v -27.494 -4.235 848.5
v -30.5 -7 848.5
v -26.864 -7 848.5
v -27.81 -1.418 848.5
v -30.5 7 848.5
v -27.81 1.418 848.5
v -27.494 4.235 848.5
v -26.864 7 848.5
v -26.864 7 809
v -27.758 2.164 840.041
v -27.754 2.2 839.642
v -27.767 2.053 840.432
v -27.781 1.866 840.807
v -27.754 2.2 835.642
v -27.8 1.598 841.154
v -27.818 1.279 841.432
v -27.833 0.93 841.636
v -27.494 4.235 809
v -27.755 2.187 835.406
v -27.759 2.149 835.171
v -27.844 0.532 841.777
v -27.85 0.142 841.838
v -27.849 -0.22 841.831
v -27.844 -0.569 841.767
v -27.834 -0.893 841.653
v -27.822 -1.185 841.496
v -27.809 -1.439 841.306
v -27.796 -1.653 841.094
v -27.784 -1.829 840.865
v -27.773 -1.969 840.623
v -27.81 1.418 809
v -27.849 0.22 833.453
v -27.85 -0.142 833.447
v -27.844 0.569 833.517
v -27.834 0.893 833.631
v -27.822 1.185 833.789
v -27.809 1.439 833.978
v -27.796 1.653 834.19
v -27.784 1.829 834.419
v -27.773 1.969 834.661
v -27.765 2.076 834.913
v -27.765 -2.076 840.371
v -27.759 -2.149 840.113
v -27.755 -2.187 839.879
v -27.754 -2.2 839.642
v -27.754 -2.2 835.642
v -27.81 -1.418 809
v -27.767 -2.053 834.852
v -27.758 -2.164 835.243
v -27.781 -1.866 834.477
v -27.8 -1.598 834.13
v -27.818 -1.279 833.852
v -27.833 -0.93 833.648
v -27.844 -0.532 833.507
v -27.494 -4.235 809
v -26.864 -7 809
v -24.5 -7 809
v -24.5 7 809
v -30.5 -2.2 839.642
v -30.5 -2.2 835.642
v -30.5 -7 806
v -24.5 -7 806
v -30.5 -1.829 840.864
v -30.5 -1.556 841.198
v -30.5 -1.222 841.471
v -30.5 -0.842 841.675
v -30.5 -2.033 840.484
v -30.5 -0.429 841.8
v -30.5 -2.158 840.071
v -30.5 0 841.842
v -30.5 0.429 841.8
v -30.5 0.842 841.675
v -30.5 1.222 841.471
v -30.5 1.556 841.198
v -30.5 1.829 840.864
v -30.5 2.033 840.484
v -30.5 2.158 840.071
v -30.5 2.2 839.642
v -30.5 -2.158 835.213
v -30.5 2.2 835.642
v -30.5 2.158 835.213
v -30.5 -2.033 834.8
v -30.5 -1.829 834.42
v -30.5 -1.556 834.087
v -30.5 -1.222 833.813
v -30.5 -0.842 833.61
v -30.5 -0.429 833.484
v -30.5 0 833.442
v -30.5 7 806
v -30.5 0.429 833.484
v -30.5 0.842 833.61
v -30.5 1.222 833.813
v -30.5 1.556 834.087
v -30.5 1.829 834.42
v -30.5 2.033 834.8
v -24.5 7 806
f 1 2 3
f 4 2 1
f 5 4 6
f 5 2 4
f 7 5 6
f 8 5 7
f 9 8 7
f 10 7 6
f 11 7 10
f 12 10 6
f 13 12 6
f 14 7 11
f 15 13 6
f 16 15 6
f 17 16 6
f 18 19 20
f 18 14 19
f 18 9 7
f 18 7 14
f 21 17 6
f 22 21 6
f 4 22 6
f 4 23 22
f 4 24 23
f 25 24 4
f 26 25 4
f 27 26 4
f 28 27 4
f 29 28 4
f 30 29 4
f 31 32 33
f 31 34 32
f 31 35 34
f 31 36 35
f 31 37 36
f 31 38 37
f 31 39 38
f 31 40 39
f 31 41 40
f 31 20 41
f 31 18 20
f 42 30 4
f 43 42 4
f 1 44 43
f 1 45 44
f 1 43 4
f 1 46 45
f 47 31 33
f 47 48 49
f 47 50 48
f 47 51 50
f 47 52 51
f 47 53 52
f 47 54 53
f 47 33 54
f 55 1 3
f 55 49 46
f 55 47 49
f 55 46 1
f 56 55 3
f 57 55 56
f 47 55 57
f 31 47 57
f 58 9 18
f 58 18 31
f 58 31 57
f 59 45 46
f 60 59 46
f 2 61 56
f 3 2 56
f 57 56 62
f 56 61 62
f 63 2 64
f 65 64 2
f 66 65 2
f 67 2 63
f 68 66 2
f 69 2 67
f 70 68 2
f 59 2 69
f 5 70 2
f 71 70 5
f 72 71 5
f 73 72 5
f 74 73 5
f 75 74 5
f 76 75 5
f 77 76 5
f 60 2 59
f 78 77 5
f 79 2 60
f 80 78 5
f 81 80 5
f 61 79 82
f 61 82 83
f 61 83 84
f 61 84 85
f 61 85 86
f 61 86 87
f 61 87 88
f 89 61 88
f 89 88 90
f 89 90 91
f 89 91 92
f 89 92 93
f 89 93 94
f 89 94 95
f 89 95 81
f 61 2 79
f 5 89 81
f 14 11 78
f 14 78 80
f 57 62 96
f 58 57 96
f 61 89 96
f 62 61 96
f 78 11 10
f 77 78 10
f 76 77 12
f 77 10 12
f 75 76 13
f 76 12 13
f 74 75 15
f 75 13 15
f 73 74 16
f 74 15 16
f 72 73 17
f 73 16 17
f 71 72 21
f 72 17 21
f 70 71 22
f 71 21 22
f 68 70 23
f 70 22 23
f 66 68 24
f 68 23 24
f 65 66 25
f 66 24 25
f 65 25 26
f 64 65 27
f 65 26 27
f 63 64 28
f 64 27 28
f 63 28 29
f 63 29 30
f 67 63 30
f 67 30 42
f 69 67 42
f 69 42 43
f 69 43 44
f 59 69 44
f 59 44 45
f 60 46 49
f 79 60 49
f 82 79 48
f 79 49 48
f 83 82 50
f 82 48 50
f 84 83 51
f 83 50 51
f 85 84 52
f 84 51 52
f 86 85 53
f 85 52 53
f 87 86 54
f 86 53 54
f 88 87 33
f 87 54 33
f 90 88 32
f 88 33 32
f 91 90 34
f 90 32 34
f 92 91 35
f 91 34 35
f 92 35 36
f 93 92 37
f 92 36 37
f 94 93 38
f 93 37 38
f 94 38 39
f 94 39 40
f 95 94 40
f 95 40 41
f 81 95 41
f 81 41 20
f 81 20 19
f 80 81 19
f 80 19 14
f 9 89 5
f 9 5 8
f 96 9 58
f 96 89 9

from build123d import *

# Parameters (mm, degrees)
BOX_W             = 6
BOX_H             = 14
BOX_DEPTH         = 42.5
POCKET077_DEPTH   = 28.001
CYLINDER012_R     = 25.35
CYLINDER012_DEPTH = 51.142136


with BuildPart() as part:
    # Box → Box (join)
    with BuildSketch(Plane(origin=(-28, -7, -42.142136), x_dir=(1, 0, 0), z_dir=(0, 0, 1))):
        with Locations((3, 7)):
            Rectangle(BOX_W, BOX_H)
    extrude(amount=BOX_DEPTH)

    # Sketch136 → Pocket077 (cut, through all)
    with BuildSketch(Plane.YZ):
        with BuildLine():
            ThreePointArc((2.2, -8.5), (0, -6.3), (-2.2, -8.5))
            Line((-2.2, -8.5), (-2.2, -12.5))
            ThreePointArc((-2.2, -12.5), (0, -14.7), (2.2, -12.5))
            Line((2.2, -8.5), (2.2, -12.5))
        make_face()
    extrude(amount=-POCKET077_DEPTH, mode=Mode.SUBTRACT)

    # Cylinder012 → Cylinder012 (cut)
    with BuildSketch(Plane.XY.offset(-39.142136)):
        Circle(CYLINDER012_R)
    extrude(amount=CYLINDER012_DEPTH, mode=Mode.SUBTRACT)


with BuildPart() as part_1:
    # Body022028 placement: moved
    add(part.part.moved(Location((-2.5, 0, 848.142136))))


solid = part_1.part
